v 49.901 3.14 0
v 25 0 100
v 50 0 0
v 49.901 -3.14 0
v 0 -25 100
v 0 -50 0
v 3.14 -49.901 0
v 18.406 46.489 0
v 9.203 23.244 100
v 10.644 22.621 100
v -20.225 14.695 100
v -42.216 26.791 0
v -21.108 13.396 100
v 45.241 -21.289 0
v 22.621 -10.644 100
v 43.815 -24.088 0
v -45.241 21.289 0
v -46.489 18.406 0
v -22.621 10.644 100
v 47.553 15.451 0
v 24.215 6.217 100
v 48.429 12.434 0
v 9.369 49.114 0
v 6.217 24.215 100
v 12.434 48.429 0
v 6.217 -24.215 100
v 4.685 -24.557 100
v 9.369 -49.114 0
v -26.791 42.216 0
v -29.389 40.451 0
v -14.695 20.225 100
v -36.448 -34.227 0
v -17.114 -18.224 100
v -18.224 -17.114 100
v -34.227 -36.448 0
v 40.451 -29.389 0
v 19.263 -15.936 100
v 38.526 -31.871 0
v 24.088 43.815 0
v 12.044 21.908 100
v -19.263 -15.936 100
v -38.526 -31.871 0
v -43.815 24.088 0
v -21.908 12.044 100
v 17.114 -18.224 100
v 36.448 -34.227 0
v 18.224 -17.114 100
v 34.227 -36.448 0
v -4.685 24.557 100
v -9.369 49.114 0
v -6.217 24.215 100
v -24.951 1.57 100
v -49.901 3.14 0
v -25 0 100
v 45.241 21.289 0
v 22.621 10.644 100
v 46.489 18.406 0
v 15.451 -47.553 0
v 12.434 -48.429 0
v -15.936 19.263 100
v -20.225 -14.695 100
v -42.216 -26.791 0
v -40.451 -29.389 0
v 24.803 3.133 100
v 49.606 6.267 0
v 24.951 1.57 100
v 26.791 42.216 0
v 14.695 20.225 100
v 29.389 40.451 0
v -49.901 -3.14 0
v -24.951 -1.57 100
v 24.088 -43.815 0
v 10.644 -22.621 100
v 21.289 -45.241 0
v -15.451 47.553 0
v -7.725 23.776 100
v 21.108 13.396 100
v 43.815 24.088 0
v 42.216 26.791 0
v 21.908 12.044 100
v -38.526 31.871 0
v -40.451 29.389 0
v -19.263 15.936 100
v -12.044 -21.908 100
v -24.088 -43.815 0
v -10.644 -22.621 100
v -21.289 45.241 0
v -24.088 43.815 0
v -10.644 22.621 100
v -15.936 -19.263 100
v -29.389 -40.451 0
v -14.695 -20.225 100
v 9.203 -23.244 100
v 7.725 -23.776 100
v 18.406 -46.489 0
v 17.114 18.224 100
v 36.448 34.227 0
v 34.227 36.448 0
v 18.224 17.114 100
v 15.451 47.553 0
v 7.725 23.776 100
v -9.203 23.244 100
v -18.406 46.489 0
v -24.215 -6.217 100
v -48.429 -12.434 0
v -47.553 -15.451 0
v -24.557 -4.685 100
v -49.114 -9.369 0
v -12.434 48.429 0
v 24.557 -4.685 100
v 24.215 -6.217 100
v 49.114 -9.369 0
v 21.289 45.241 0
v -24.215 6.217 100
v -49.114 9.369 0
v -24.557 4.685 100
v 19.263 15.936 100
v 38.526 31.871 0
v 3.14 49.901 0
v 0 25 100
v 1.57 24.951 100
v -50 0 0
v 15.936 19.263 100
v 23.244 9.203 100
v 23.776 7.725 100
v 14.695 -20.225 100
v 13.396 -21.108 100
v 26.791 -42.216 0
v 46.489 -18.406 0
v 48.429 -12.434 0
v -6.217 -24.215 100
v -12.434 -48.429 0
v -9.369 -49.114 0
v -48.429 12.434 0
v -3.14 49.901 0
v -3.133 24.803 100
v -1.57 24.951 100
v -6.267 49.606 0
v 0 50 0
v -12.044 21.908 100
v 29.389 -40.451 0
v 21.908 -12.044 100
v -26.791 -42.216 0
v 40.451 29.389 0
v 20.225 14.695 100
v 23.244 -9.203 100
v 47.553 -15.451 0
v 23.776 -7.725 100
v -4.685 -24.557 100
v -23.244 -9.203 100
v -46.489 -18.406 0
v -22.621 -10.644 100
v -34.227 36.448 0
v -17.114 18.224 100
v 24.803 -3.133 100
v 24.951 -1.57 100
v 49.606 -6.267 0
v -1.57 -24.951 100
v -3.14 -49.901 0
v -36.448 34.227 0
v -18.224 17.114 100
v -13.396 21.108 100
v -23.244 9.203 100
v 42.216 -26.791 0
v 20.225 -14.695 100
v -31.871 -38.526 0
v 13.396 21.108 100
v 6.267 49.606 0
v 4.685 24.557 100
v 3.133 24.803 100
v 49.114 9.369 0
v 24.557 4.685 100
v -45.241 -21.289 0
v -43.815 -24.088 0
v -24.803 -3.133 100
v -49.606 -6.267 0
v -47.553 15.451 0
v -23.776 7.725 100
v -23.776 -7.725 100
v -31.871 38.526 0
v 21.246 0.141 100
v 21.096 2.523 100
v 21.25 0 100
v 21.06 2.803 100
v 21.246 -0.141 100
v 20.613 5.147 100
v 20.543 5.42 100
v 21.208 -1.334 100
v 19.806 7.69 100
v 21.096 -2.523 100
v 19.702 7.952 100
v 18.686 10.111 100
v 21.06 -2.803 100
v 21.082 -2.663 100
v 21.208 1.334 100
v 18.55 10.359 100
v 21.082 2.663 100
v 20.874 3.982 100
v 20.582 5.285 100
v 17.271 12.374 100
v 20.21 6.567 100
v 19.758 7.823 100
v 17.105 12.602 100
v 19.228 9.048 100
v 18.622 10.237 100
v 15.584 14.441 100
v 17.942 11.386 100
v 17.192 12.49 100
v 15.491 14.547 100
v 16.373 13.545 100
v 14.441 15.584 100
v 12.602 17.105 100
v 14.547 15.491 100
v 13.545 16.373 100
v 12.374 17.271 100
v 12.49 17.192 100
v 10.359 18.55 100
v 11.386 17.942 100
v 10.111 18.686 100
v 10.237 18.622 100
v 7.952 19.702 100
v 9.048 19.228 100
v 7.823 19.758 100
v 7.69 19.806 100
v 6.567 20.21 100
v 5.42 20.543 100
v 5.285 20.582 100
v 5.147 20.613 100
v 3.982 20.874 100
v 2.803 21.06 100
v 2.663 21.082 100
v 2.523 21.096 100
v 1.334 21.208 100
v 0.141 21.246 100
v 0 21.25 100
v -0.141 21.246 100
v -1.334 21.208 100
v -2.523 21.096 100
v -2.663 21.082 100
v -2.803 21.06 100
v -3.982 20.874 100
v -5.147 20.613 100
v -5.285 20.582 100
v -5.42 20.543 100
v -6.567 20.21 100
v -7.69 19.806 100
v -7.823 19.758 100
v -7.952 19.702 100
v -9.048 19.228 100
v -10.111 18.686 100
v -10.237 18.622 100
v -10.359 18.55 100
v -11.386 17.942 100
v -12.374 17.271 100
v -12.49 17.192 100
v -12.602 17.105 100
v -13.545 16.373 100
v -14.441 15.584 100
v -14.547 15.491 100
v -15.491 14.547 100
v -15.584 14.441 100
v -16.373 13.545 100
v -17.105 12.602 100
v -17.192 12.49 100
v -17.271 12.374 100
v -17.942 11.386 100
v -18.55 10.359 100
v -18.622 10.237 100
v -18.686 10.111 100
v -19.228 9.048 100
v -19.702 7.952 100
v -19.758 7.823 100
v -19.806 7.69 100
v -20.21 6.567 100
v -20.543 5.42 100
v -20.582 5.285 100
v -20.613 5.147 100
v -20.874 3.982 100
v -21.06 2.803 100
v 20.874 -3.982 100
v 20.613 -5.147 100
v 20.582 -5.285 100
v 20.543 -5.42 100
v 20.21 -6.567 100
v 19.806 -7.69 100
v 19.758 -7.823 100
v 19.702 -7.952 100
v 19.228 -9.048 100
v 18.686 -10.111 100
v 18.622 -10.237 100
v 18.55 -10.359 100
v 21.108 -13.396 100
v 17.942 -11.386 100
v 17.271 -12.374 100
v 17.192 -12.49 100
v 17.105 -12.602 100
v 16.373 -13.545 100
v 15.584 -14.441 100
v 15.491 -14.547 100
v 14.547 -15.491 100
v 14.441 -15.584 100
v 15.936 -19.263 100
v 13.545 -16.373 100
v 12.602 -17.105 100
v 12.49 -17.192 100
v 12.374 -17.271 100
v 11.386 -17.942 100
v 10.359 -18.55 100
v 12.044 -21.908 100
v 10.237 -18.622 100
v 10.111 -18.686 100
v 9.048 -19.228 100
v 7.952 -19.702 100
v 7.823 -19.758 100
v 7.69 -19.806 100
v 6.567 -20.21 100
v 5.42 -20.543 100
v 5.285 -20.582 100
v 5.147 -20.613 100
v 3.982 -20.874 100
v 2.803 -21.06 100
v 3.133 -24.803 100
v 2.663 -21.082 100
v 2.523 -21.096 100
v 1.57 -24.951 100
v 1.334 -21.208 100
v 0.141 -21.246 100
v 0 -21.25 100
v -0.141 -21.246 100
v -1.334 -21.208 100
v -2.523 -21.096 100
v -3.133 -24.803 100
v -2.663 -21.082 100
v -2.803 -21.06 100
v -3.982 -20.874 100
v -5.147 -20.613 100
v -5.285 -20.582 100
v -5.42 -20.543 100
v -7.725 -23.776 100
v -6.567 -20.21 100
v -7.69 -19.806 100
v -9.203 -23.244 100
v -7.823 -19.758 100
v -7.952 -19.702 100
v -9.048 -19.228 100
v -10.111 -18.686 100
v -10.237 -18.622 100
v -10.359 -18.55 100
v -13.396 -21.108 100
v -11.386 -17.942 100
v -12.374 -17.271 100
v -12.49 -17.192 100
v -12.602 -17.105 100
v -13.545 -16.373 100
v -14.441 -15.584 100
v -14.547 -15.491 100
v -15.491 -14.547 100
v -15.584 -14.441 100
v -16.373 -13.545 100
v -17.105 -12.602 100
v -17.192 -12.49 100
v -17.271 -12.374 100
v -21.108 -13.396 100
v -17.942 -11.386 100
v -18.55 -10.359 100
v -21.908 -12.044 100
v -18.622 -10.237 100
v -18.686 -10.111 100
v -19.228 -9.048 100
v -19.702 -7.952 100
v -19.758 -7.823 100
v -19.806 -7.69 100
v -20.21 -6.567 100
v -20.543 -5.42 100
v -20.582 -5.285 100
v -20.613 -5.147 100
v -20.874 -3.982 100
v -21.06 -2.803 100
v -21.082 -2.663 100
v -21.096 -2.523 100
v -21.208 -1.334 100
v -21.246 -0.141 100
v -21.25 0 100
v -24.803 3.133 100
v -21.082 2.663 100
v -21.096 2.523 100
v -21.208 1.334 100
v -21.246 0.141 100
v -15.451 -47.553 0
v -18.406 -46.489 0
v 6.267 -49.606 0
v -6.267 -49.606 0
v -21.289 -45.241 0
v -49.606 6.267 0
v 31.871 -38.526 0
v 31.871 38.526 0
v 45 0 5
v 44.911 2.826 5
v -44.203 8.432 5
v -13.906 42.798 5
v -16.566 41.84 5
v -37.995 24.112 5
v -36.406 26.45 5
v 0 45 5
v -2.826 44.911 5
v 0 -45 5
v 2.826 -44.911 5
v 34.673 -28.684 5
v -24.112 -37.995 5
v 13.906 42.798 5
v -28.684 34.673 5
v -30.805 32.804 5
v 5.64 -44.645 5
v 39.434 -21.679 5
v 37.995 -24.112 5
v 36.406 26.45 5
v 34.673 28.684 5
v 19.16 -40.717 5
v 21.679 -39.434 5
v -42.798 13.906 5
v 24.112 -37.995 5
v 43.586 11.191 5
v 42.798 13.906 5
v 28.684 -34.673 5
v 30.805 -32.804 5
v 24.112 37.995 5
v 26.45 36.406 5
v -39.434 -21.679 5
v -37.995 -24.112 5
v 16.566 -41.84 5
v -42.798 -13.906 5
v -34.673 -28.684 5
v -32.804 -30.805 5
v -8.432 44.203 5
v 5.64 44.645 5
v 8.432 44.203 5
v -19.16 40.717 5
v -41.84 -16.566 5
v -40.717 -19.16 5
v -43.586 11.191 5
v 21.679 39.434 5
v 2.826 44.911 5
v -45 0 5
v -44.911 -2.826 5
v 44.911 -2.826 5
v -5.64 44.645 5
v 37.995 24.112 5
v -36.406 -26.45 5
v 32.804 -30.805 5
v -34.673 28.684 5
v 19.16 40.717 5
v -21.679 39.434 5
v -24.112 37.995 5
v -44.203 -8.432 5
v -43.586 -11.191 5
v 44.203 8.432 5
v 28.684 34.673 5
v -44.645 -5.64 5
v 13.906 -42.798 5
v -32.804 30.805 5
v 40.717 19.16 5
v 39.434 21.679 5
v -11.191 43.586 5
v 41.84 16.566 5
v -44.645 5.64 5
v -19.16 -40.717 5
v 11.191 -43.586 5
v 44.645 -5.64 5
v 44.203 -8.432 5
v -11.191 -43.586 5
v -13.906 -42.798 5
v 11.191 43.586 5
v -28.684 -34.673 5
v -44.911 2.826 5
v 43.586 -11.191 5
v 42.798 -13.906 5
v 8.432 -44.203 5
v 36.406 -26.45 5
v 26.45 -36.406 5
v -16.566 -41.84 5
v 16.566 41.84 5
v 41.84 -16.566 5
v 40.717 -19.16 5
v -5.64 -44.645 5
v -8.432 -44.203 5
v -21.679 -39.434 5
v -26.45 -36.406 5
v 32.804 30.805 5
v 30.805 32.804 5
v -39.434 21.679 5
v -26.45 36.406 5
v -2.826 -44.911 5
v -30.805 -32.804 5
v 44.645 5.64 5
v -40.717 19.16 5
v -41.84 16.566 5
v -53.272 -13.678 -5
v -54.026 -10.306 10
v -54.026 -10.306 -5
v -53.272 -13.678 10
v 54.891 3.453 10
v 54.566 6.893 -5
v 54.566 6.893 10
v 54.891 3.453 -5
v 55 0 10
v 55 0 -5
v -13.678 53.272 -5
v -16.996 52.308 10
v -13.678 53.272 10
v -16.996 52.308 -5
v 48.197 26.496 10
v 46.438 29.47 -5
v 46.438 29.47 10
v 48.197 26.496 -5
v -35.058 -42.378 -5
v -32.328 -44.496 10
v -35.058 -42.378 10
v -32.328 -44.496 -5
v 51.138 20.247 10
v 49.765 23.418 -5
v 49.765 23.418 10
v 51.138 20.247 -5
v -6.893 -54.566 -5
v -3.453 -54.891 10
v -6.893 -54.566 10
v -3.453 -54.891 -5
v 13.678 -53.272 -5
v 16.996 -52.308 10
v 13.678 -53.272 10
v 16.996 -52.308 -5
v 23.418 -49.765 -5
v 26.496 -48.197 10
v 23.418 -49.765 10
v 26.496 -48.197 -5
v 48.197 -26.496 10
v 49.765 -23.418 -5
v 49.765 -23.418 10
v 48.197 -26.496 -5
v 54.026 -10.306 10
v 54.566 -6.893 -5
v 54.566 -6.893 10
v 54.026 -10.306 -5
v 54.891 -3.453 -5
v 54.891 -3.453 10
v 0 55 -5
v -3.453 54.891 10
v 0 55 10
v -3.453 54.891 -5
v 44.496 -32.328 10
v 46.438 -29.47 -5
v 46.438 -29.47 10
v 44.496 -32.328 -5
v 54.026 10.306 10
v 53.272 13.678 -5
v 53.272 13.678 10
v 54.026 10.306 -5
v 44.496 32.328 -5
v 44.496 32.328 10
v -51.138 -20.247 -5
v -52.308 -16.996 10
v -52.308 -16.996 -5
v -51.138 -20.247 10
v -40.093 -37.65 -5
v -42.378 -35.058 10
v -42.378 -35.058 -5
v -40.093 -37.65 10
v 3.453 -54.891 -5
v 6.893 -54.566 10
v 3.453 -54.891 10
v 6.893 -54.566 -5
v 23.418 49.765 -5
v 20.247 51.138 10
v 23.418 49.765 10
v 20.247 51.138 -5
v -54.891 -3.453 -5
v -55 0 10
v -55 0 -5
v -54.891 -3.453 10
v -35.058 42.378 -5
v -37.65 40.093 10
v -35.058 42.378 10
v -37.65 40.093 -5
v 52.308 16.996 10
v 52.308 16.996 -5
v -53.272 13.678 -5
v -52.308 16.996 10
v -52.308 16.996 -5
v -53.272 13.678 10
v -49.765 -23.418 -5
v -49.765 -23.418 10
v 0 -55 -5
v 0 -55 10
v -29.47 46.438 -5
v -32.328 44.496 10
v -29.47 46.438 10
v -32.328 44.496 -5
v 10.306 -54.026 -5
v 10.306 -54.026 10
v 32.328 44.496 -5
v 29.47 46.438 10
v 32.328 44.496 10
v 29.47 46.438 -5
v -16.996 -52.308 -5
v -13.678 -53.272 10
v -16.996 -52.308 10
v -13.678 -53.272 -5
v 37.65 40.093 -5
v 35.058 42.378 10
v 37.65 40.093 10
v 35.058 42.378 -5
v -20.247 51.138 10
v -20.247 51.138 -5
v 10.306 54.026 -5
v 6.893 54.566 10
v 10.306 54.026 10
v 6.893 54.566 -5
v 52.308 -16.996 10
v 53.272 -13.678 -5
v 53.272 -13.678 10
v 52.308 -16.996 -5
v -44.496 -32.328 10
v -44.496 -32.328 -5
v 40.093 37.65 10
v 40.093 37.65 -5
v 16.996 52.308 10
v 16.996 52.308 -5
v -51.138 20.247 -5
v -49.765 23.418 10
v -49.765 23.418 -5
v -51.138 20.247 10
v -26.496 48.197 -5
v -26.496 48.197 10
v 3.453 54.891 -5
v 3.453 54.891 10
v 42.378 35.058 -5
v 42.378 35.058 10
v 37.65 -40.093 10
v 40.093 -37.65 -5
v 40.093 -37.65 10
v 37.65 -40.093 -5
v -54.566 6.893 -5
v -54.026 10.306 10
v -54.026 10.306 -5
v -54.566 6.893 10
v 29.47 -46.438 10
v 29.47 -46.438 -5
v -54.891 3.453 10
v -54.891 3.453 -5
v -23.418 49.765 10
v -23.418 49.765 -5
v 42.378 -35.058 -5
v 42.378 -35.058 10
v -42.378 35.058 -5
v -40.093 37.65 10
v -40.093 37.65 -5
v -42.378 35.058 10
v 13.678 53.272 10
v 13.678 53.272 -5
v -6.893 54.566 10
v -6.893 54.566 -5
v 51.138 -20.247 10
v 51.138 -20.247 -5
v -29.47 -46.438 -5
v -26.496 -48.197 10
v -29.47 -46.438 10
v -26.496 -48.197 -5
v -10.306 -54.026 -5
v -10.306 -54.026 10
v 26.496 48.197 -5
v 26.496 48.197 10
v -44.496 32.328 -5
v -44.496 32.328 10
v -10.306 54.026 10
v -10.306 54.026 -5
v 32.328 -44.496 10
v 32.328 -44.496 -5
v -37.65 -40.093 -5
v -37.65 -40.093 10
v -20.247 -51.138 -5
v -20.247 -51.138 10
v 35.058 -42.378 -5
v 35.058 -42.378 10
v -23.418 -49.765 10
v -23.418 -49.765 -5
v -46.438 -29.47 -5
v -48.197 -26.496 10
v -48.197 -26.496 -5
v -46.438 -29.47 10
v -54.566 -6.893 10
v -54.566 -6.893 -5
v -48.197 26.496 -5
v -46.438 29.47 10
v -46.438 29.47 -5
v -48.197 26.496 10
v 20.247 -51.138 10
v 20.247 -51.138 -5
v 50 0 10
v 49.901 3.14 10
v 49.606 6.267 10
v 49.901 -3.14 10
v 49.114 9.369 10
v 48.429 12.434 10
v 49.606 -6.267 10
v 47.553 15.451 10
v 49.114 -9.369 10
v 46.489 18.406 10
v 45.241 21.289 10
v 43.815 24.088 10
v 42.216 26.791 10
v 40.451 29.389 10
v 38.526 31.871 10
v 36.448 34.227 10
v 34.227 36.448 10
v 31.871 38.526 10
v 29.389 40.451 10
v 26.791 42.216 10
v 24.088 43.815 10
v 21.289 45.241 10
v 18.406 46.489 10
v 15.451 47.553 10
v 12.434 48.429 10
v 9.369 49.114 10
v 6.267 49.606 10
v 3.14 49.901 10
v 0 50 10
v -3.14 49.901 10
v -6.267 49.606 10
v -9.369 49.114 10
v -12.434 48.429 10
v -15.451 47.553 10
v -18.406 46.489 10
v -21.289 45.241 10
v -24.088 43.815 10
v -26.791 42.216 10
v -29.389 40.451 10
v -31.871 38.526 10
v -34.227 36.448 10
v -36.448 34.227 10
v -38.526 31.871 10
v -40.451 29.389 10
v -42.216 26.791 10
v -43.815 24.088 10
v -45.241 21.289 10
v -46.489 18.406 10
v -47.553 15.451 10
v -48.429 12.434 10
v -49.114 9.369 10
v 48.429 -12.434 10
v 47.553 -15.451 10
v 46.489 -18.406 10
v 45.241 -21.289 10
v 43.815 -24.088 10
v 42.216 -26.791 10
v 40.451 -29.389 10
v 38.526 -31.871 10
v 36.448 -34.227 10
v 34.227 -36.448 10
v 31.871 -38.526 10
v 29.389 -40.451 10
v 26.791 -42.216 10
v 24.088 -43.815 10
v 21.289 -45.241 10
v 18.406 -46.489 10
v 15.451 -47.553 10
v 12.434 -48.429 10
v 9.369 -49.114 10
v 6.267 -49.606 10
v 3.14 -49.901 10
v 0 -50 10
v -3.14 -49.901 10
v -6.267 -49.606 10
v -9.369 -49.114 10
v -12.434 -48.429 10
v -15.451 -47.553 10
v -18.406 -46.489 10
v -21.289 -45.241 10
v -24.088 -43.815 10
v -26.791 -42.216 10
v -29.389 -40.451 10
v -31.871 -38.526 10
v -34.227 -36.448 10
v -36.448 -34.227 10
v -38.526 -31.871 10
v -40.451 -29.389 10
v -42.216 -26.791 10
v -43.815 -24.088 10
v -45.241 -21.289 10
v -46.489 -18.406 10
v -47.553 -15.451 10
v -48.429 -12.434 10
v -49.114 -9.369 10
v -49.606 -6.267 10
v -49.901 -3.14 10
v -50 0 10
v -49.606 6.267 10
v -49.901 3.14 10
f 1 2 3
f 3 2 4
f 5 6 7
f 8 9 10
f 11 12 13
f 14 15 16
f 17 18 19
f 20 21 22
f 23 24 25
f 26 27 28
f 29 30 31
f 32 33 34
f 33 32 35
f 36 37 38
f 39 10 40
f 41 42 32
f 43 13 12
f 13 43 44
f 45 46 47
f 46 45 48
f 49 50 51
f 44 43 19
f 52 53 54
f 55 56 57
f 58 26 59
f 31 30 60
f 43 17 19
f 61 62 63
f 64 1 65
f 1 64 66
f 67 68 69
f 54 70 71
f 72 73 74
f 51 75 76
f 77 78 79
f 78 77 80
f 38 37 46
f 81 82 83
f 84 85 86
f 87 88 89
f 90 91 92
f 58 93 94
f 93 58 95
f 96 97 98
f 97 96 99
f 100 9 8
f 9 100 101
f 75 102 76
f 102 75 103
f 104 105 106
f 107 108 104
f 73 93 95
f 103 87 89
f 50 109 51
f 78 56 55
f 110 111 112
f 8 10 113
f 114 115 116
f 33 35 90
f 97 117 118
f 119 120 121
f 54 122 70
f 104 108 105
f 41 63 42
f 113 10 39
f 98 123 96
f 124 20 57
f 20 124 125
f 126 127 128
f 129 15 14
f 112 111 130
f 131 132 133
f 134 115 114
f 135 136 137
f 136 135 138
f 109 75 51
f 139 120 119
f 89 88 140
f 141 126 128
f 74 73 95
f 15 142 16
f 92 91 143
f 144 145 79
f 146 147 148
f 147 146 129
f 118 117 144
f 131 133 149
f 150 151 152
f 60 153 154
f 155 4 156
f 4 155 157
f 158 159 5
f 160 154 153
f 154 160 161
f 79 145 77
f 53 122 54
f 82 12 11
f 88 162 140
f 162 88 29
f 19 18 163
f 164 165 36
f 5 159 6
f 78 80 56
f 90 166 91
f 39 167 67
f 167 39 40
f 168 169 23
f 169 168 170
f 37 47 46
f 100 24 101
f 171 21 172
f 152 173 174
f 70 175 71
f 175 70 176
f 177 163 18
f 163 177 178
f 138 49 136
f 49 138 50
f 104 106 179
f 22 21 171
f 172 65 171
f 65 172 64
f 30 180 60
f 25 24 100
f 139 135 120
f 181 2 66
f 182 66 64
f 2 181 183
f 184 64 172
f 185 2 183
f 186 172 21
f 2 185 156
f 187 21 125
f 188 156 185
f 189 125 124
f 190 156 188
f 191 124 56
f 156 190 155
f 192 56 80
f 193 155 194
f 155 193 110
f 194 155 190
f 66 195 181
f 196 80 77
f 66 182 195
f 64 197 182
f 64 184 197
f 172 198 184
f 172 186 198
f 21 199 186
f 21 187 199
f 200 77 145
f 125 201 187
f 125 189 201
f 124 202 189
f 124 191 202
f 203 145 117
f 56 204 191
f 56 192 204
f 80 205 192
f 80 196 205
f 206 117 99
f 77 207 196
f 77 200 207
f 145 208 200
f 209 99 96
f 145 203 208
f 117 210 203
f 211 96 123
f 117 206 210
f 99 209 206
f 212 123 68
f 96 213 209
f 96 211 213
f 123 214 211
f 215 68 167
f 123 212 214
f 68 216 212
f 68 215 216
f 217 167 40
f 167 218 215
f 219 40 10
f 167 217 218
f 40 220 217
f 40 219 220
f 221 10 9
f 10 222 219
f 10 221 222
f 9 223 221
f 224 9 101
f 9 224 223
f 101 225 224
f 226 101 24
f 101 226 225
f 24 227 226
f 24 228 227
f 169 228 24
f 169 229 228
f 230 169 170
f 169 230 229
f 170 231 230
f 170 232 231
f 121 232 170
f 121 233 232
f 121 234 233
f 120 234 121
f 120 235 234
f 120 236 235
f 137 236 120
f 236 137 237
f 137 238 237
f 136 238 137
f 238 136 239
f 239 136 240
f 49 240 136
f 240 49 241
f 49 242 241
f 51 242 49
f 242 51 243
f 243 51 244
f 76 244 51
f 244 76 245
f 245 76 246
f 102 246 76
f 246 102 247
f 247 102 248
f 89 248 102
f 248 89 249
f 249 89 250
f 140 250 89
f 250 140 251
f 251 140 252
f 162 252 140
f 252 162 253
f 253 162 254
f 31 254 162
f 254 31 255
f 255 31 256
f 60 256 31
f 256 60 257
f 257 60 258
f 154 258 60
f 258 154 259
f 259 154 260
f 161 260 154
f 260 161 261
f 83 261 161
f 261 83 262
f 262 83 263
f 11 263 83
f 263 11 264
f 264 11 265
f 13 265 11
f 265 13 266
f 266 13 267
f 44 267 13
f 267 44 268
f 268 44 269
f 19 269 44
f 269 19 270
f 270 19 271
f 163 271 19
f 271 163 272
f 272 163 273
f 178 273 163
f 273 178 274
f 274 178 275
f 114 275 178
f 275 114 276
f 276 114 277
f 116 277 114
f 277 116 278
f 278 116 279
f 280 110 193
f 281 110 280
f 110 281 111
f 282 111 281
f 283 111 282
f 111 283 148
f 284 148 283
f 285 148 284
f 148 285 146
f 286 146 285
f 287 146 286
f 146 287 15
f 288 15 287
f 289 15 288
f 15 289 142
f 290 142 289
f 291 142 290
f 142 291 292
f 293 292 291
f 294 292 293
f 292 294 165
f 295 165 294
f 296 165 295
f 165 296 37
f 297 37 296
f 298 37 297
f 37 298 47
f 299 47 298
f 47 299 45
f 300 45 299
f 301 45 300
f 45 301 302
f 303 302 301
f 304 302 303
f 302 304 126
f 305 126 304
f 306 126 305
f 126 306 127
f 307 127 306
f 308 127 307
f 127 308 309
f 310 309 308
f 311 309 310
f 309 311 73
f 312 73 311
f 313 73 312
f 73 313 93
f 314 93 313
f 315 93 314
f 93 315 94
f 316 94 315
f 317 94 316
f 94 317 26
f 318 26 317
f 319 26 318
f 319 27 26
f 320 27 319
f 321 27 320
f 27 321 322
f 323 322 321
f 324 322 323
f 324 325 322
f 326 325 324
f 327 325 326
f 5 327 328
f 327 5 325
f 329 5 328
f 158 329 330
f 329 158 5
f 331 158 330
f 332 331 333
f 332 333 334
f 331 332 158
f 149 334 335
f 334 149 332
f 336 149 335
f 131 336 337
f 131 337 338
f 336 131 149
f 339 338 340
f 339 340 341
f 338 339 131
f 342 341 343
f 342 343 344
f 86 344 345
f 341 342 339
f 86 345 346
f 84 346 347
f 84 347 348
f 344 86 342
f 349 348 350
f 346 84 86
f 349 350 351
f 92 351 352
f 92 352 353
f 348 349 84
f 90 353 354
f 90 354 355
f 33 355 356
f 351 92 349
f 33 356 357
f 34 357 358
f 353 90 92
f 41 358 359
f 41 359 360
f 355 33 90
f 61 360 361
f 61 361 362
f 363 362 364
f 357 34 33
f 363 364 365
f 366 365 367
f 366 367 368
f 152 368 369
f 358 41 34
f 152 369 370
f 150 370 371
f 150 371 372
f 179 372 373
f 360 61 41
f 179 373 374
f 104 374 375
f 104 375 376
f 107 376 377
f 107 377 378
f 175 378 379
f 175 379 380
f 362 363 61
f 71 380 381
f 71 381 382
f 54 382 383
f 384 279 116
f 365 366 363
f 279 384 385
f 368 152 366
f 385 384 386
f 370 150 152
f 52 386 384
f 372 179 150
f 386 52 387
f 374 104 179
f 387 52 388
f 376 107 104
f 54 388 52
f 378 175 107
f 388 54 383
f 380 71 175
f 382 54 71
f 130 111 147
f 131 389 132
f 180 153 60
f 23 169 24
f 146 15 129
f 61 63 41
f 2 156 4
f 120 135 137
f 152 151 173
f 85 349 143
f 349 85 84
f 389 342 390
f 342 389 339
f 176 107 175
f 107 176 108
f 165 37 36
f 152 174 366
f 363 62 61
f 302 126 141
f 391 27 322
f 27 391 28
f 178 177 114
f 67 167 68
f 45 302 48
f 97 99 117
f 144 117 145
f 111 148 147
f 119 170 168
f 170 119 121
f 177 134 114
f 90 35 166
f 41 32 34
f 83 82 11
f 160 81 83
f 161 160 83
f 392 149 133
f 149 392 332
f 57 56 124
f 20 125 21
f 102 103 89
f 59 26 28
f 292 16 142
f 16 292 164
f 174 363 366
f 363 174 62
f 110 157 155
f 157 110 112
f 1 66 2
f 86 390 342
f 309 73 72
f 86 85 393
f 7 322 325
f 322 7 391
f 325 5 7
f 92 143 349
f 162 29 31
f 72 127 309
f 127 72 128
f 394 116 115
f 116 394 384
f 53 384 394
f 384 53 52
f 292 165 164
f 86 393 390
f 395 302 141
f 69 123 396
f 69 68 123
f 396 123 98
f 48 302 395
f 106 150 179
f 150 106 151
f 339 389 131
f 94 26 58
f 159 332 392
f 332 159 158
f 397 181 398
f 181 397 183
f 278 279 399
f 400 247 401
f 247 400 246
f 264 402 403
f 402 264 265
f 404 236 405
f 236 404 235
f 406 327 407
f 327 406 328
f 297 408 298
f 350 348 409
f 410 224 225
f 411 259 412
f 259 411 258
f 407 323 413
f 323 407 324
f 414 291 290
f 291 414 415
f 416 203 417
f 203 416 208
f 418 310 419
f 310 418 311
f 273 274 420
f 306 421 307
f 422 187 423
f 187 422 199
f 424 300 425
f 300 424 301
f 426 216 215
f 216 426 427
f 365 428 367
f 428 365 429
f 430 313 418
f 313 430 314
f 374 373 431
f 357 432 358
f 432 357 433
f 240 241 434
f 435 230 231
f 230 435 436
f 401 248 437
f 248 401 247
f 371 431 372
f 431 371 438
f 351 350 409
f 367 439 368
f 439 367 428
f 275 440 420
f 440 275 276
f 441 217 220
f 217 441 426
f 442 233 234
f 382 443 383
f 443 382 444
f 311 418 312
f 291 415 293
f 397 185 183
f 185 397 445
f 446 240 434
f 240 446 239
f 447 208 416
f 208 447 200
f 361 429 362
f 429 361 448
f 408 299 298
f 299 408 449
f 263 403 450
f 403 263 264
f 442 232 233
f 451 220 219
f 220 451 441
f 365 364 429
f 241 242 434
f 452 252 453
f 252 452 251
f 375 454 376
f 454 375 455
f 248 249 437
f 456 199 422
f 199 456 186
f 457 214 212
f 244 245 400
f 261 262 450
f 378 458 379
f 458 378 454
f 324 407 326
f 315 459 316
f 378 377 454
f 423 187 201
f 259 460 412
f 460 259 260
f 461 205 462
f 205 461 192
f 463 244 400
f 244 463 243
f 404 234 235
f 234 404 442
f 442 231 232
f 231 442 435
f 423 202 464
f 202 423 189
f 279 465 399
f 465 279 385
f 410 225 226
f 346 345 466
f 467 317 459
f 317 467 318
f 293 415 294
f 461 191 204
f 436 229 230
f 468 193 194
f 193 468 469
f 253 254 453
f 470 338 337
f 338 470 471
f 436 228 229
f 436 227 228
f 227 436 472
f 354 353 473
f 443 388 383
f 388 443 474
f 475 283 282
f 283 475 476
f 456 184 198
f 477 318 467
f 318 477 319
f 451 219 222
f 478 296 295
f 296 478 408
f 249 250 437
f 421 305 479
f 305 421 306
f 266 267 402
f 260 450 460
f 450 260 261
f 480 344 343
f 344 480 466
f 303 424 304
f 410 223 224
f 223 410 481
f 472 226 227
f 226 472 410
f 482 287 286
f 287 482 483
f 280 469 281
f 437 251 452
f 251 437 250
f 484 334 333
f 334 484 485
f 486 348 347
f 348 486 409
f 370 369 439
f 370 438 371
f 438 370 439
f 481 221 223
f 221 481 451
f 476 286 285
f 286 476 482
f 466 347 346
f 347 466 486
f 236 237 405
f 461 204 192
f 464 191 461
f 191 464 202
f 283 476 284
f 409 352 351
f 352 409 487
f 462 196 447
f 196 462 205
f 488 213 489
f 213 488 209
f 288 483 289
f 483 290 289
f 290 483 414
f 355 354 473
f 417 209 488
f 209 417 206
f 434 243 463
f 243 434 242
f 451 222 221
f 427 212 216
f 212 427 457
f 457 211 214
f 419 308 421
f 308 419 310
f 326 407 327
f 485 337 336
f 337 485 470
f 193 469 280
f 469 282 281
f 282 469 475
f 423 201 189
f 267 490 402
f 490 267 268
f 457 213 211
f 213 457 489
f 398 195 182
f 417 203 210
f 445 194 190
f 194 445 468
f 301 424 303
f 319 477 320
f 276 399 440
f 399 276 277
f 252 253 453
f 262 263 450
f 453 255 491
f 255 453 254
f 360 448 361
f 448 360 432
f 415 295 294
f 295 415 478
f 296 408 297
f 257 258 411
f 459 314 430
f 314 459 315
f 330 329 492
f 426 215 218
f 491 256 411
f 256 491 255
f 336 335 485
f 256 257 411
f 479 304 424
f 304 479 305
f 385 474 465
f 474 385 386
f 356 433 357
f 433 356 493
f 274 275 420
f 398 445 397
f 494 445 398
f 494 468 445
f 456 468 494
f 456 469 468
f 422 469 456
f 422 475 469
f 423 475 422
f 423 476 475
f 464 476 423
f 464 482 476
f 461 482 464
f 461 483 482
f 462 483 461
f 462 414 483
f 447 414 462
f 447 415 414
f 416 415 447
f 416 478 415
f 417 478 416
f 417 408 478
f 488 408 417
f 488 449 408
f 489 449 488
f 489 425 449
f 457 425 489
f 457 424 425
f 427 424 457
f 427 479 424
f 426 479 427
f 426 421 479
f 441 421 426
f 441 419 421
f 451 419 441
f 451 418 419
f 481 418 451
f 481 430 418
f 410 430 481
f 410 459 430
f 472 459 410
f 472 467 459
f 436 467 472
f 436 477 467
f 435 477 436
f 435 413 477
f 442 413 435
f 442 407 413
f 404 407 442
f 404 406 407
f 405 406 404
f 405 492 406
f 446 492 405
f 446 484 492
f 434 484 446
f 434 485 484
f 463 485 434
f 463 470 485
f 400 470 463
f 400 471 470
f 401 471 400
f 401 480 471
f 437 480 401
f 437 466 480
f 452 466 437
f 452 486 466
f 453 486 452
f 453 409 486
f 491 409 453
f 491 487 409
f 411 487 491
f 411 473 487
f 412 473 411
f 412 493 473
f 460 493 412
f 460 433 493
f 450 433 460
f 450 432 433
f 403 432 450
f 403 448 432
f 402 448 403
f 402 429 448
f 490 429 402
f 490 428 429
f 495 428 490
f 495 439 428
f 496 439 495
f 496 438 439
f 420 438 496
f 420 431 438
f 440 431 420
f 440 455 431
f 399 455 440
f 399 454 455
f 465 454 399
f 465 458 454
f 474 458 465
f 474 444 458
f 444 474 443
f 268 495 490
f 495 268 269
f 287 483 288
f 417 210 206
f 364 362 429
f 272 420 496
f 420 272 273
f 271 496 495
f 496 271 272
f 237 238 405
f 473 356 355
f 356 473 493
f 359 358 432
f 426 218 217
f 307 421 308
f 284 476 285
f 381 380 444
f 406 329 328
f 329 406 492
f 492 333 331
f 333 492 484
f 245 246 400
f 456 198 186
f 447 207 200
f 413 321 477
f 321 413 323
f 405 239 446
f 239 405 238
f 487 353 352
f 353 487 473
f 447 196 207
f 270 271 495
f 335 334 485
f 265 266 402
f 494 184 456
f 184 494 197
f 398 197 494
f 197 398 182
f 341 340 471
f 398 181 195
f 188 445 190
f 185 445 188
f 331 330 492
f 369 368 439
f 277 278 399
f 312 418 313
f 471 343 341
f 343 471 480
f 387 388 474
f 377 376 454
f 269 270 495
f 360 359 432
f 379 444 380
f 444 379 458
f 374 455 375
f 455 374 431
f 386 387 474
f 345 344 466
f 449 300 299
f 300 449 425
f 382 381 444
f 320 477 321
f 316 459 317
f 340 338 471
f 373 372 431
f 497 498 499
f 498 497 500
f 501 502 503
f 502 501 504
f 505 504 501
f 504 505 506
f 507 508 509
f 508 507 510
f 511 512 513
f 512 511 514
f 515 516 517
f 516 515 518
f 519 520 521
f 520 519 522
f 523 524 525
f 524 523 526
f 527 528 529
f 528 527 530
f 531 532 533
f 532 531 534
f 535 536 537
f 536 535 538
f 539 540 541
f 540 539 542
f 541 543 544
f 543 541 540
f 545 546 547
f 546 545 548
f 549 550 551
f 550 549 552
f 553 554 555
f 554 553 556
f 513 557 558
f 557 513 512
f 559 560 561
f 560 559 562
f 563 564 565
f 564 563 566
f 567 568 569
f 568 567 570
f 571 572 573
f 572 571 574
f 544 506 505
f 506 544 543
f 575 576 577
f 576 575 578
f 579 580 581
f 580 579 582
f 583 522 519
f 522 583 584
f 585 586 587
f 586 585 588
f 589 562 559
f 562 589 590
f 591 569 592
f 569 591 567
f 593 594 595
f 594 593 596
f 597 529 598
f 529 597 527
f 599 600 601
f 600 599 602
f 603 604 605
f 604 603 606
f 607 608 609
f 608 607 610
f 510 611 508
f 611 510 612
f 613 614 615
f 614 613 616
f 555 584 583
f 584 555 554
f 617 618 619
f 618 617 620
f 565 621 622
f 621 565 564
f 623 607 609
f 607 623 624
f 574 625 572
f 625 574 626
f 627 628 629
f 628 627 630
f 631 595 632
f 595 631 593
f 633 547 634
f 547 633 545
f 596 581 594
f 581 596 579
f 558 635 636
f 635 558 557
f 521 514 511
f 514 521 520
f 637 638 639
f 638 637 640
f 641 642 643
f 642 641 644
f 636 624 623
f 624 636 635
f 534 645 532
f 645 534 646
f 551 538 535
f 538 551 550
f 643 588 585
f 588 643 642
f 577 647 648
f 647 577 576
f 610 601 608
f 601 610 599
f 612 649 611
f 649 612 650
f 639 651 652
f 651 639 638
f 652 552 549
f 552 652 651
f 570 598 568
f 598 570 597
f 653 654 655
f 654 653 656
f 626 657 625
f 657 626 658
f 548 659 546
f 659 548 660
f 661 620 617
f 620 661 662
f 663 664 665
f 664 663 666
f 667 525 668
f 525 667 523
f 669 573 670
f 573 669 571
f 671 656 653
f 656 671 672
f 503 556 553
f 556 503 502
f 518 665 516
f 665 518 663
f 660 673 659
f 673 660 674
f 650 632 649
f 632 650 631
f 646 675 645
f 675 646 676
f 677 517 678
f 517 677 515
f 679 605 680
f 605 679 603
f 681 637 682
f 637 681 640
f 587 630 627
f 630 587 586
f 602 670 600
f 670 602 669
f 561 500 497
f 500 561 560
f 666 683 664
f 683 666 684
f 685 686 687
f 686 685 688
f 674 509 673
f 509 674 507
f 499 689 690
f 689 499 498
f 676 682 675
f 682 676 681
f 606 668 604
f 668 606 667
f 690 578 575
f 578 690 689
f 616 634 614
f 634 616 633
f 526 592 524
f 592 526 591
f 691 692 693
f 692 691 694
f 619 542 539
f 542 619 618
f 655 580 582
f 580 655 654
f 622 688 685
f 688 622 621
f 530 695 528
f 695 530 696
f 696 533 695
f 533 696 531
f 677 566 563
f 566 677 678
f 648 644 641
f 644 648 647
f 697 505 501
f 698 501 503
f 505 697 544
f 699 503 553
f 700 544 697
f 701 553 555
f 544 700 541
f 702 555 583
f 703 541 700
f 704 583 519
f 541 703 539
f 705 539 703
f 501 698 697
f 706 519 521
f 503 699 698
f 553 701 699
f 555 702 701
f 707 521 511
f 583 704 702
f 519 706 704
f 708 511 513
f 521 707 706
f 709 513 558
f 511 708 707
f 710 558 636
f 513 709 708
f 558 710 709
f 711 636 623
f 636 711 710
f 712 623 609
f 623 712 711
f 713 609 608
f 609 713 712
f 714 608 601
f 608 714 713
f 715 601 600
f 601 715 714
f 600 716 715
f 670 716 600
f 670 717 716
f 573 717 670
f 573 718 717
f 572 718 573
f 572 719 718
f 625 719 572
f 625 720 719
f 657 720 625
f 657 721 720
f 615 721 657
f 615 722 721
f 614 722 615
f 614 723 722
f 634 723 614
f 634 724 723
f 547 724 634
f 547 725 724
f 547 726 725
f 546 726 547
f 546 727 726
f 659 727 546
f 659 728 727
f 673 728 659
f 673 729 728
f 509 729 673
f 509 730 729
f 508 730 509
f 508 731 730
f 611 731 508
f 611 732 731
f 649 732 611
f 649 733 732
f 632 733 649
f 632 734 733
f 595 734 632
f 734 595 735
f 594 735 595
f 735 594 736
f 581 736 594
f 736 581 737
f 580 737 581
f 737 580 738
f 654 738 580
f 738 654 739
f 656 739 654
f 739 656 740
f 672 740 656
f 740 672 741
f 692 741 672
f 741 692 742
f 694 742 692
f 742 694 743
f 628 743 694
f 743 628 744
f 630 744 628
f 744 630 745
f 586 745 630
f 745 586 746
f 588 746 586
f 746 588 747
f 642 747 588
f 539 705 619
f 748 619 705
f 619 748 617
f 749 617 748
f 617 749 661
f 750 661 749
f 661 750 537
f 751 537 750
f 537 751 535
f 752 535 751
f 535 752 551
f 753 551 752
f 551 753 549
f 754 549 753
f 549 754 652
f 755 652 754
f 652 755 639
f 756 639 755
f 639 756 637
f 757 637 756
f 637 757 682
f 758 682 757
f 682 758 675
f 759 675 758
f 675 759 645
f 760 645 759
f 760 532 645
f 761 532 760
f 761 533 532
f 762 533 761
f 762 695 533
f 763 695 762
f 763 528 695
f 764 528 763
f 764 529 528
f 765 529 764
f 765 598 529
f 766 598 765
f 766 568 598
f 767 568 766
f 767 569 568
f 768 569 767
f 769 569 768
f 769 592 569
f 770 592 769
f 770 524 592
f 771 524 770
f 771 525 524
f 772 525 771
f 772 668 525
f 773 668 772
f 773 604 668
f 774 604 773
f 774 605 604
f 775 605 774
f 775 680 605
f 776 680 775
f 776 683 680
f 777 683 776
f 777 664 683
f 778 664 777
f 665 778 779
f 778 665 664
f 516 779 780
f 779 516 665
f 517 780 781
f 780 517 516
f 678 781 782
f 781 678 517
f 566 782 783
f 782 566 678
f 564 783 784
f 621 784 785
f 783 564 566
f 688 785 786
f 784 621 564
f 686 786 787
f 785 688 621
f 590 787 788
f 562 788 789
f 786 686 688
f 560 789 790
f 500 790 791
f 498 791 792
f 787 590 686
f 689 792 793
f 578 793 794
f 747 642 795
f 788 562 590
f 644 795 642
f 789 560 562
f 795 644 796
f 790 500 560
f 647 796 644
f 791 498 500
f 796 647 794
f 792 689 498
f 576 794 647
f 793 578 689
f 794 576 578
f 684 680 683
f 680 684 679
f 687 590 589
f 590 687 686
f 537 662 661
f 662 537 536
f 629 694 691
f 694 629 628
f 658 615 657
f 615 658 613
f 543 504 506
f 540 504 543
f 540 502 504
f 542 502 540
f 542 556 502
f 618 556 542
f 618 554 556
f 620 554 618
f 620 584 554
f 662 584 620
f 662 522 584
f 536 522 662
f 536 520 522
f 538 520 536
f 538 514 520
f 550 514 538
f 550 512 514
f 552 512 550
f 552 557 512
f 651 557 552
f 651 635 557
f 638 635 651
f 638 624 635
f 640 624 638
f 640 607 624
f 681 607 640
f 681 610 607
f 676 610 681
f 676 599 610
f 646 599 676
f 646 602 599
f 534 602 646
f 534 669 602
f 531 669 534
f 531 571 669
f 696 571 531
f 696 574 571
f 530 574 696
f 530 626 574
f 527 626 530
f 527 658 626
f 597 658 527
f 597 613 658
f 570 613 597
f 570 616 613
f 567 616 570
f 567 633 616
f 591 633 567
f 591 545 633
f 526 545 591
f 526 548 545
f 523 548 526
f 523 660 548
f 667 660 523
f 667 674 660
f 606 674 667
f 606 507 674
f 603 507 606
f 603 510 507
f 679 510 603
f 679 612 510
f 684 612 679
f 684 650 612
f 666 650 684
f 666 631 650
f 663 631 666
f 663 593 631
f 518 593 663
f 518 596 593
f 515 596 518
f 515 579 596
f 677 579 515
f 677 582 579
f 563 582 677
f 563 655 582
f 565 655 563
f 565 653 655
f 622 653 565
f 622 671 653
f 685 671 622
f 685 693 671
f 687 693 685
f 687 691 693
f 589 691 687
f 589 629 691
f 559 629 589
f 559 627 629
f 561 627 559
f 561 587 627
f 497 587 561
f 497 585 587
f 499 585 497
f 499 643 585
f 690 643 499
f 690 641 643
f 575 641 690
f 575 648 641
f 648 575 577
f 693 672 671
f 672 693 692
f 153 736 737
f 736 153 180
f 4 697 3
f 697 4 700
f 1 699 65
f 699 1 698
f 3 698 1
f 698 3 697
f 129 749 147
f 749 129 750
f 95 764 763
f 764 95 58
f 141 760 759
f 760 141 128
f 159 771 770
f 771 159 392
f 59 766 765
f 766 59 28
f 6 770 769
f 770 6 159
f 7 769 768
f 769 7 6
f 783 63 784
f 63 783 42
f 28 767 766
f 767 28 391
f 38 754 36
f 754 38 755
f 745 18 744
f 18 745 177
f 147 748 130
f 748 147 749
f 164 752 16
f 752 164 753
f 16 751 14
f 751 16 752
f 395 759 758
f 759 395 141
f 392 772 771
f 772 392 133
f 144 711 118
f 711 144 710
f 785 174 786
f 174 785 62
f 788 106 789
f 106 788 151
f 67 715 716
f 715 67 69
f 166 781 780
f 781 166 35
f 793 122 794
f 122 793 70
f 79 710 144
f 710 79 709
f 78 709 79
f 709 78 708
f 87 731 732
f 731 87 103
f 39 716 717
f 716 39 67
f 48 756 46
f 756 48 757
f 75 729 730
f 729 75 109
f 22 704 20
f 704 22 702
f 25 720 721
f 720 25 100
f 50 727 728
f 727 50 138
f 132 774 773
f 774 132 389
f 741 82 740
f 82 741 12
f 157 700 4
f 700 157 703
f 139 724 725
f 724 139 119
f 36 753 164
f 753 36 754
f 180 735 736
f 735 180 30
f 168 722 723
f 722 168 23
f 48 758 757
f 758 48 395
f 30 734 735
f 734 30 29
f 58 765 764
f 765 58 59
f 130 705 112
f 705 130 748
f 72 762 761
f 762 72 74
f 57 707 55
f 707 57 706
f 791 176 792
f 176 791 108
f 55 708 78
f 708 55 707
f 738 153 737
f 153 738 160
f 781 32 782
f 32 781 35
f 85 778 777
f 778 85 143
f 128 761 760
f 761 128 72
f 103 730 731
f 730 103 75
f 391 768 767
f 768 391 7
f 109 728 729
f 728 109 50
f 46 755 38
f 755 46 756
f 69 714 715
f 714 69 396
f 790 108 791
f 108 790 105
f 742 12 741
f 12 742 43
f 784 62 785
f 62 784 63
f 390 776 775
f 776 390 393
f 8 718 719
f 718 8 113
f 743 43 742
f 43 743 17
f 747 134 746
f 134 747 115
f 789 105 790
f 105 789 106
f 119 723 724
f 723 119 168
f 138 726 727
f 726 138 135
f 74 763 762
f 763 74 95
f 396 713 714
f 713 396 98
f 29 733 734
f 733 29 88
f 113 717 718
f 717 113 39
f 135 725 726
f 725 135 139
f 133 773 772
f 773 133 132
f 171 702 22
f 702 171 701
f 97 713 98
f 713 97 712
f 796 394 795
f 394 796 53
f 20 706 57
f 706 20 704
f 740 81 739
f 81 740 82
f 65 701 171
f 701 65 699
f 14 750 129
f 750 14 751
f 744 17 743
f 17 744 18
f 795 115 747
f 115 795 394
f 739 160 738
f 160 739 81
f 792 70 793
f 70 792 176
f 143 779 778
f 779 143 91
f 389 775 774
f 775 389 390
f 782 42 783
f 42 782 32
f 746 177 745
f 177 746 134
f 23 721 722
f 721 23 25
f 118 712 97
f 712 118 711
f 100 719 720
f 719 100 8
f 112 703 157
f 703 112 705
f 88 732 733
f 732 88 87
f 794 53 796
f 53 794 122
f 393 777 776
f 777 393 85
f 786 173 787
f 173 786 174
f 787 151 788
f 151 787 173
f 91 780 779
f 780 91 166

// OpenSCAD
// Custom Planter
// Creator: Levi Oxner
// Created:October 10, 2018


/* [Part] */
Units="mm"; //[mm,inches]

Part="3";//[1:Planter,2:Plate,3:Joined Planter & Plate,4:Spaced Planter & Plate]

/* [Planter] */

//Shape (Only Smooth Circle is visible on the preview, check my uploaded STL files for examples of other shapes)
$fn=100; //[3:Triangle,4:Square,5:Pentagon,6:Hexagon,10:Rough "Circle",100:Smooth Circle]

// Base Diameter
B_Diameter=100; 

// Mouth Diameter
M_Diameter=50; 

// Planter Height
Height=100; 

//Thickness inward from outerdiameter (Keep less than ~1/2 the Diameters)
Thickness=5; 


/* [Drain Hole] */
//Do you want a drain hole?
Drain= "No"; //[Yes,No]

//Drain Hole Diameter
D_Diameter=5; 


/* [Plate] */
//How much larger the plate is from the base diameter (recommend greater than Plate Thickness)
Plate_Diameter_Difference=10;

//Plate Rim Depth
Plate_Depth=10; 

//Plate Thicness inward from outerdiameter
Plate_Thickness=5;

//Spaced Planter & Plate Gape (Mind if you're printing with or without supports)
Gape=2;



if (Part=="4"){
    if (Units=="mm"){
        Custom_Planter();
        translate([0,0,(Plate_Depth+Plate_Thickness)/2-Plate_Thickness-Gape])
            Plate();
    }if(Units=="inches"){
        scale([25.4,25.4,25.4])
            Custom_Planter();
        scale([25.4,25.4,25.4])
        translate([0,0,(Plate_Depth+Plate_Thickness)/2-Plate_Thickness-Gape])
            Plate();
    }
}else if(Part=="3"){
    if (Units=="mm"){
        Custom_Planter();
        translate([0,0,(Plate_Depth+Plate_Thickness)/2-Plate_Thickness])
            Plate();
    }if(Units=="inches"){
        scale([25.4,25.4,25.4])
            Custom_Planter();
        scale([25.4,25.4,25.4])
        translate([0,0,(Plate_Depth+Plate_Thickness)/2-Plate_Thickness])
            Plate();
    }
}else if(Part=="2"){
    if(Units=="mm"){
        Plate();
    }if(Units=="inches"){
        scale([25.4,25.4,25.4])
            Plate();
    }
}else{
    if(Units=="mm"){
        Custom_Planter();
    }if(Units=="inches"){
        scale([25.4,25.4,25.4])
            Custom_Planter();
    }
}


/////////////////////////////////Planter////////////////////////////////////////////

module Custom_Planter(){
    
    difference(){
        translate([0,0,Height/2])
            cylinder(h=Height,d1=B_Diameter,d2=M_Diameter,center=true);
        translate([0,0,Height/2+Thickness])
            cylinder(h=Height,d1=B_Diameter-2*Thickness,d2=M_Diameter-2*Thickness,center=true);
        
        //Drain
        if(Drain=="Yes"){
            translate([0,0,Thickness/2])
                cylinder(h=Thickness,d=D_Diameter,center=true);
        }//if drain
        
    }//difference
}//module planter


///////////////////////////////////Plate////////////////////////////////////////////

module Plate(){
    
    difference(){
            cylinder(h=Plate_Depth+Plate_Thickness,d=Plate_Diameter_Difference+B_Diameter,center=true);
        translate([0,0,Plate_Thickness])
            cylinder(h=Plate_Depth+Plate_Thickness,d=Plate_Diameter_Difference+B_Diameter-2*Plate_Thickness,center=true);
    }//difference
    
}//module plate
